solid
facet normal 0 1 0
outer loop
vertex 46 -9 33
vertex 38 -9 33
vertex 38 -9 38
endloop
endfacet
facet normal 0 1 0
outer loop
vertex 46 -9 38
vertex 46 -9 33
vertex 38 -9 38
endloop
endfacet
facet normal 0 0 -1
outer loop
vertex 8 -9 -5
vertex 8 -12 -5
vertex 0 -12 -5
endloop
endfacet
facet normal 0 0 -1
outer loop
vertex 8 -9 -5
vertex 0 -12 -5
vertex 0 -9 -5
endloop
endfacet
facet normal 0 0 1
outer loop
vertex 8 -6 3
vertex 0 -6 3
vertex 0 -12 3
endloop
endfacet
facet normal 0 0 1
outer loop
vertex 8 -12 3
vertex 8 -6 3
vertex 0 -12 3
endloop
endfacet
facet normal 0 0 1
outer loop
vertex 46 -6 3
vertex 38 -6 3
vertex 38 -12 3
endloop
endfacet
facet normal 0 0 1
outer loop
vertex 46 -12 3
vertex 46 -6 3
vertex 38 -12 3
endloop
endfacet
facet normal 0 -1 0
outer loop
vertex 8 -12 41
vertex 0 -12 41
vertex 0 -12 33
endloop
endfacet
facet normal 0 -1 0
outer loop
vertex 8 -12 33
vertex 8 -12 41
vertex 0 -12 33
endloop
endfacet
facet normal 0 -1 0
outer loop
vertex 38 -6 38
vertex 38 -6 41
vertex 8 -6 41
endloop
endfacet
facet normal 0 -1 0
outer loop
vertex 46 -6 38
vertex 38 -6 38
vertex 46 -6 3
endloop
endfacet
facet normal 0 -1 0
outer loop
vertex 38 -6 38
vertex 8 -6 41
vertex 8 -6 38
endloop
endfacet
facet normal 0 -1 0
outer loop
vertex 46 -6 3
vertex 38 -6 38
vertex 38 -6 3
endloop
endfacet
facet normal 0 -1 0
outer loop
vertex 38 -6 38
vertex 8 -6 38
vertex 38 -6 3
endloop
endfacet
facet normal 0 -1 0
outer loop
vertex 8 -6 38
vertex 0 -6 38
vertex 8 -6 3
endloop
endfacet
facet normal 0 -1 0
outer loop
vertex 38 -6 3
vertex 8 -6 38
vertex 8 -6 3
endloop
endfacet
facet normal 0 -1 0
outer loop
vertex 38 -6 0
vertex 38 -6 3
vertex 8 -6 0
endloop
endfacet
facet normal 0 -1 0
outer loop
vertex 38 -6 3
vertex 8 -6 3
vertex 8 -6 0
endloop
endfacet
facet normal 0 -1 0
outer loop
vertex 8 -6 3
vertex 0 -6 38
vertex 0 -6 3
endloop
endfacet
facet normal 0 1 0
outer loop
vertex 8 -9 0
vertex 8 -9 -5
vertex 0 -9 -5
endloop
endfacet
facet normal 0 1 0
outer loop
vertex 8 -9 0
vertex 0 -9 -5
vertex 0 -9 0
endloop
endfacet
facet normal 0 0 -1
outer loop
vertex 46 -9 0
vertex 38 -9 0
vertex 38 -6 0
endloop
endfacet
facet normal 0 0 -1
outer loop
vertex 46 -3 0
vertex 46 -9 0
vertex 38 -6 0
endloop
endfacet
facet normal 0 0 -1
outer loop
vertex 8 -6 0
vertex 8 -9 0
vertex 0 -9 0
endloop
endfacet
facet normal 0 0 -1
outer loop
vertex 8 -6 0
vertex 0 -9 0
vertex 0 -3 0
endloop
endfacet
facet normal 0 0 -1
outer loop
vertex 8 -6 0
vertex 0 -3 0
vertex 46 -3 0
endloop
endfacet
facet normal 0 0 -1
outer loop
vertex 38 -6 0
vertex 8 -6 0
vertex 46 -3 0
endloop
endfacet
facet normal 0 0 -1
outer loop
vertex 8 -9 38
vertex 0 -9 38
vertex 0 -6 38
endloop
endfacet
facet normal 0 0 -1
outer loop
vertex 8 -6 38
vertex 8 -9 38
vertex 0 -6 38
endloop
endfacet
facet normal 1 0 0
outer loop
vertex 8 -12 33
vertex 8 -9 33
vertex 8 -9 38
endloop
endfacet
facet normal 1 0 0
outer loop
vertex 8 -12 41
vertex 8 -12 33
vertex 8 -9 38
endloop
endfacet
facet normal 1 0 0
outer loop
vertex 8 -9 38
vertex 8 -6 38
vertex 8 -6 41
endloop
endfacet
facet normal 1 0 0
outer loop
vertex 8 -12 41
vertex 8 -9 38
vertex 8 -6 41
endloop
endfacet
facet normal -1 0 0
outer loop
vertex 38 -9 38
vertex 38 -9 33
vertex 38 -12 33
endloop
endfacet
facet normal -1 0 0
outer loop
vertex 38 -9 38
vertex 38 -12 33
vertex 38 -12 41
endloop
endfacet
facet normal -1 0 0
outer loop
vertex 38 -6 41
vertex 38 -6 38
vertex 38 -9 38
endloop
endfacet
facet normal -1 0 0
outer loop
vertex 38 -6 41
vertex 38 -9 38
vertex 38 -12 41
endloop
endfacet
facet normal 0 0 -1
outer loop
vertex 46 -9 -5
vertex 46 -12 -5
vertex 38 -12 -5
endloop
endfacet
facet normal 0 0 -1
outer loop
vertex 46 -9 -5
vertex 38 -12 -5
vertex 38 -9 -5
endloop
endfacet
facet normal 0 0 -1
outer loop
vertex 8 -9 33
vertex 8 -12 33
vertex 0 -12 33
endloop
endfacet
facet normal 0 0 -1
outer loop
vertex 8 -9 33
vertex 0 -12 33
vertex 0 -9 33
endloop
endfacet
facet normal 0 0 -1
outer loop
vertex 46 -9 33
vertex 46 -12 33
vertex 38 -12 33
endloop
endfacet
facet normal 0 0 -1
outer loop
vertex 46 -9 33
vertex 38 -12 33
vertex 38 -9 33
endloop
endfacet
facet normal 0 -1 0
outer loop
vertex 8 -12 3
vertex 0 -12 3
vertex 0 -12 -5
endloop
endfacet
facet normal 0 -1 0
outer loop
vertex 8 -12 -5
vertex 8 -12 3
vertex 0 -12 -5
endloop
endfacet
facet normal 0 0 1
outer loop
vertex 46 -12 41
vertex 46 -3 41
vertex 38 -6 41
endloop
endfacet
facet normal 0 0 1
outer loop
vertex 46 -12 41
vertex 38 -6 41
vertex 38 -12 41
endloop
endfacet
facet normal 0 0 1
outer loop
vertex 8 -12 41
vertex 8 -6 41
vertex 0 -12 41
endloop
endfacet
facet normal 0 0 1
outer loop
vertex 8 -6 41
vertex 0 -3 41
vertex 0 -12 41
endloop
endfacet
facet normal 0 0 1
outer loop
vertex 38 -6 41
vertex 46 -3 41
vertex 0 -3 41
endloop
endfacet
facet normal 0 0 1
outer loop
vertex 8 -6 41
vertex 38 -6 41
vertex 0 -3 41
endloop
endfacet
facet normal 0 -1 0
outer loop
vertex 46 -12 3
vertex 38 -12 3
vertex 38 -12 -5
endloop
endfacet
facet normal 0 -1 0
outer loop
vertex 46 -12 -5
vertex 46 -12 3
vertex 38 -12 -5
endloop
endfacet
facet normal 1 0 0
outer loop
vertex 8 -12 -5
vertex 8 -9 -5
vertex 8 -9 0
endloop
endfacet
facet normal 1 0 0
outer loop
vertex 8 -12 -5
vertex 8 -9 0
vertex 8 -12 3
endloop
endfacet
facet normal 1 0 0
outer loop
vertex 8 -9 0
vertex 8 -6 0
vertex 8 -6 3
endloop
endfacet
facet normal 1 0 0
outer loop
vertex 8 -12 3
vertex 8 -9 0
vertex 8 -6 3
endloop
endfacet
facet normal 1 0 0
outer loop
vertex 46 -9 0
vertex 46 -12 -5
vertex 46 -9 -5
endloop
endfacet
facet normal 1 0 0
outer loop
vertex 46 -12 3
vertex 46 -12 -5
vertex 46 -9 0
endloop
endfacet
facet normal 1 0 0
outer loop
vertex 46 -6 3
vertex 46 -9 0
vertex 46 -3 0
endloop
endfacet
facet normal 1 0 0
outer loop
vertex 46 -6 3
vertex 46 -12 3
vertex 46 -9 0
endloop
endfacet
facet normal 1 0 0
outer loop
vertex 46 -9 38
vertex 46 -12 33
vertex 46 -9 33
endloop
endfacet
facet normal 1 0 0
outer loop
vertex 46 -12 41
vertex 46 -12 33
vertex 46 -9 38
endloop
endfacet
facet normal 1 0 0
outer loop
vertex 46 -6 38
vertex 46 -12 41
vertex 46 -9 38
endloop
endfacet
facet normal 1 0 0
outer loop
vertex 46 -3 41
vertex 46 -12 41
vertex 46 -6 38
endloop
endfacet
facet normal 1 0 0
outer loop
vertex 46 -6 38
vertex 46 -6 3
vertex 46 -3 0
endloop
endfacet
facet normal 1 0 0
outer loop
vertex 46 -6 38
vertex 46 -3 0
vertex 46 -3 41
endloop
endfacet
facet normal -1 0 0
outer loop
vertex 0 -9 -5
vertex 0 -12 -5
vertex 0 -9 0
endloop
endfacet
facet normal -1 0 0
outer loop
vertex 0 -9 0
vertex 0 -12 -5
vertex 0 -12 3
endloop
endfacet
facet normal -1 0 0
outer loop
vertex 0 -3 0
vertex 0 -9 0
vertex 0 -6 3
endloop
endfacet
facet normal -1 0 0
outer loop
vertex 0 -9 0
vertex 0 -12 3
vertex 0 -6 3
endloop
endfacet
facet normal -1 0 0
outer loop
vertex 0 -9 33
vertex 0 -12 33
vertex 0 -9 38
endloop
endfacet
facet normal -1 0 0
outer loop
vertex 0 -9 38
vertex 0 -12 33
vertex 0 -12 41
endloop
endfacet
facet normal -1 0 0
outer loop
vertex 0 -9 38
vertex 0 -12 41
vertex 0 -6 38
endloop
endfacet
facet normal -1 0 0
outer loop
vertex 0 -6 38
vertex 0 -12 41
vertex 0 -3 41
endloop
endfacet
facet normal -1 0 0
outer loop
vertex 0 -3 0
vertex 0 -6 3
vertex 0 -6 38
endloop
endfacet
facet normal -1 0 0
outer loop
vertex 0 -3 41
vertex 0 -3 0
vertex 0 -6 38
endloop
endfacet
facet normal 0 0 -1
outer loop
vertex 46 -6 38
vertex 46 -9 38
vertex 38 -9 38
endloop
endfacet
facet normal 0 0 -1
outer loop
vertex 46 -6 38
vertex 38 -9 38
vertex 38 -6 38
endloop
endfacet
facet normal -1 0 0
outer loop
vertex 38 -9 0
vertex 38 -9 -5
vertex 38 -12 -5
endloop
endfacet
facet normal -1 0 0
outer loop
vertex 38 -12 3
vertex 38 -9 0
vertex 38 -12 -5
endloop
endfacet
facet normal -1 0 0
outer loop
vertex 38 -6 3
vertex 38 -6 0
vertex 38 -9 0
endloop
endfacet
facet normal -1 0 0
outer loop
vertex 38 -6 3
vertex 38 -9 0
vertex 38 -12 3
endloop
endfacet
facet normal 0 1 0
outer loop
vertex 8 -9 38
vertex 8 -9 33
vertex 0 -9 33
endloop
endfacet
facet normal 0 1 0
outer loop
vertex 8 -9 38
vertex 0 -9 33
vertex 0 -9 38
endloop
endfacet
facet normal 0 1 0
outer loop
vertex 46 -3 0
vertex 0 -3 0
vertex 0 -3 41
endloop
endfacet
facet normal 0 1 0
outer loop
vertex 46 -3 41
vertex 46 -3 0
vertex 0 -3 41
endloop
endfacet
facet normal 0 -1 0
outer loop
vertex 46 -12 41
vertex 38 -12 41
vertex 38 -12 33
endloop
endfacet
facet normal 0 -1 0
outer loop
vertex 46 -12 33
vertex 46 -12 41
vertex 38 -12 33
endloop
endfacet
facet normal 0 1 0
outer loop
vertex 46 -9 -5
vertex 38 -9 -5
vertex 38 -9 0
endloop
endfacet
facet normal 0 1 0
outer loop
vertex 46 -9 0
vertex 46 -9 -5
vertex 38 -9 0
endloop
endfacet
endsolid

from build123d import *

# Parameters (mm, degrees)
F2_DEPTH = 46
F3_W     = 30
F3_H     = 46
F4_DEPTH = 6.001


with BuildPart() as f2:
    # F1 (on Right) → F2 (new body)
    with BuildSketch(Plane.YZ):
        Polygon((-9, 38), (-6, 38), (-6, 3), (-12, 3), (-12, -5), (-9, -5), (-9, 0), (-3, 0), (-3, 41), (-12, 41), (-12, 33), (-9, 33), align=None)
    extrude(amount=F2_DEPTH)

    # F3 (on face) → F4 (cut, through all)
    with BuildSketch(Plane.XZ.offset(6)):
        with Locations((23, 18)):
            Rectangle(F3_W, F3_H)
    extrude(amount=F4_DEPTH, mode=Mode.SUBTRACT)


solid = f2.part
